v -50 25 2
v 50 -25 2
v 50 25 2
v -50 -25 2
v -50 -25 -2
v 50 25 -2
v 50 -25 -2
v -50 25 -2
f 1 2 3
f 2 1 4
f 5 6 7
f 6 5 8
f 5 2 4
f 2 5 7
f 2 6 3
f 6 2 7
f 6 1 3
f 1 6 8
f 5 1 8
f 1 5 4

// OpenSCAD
// Starter file for task-006.
// Edit this file in OpenSCAD to complete the requested hard task.
$fn = 64;

panel_w = 100;
panel_d = 50;
panel_t = 4;
cube([panel_w, panel_d, panel_t], center=true);
